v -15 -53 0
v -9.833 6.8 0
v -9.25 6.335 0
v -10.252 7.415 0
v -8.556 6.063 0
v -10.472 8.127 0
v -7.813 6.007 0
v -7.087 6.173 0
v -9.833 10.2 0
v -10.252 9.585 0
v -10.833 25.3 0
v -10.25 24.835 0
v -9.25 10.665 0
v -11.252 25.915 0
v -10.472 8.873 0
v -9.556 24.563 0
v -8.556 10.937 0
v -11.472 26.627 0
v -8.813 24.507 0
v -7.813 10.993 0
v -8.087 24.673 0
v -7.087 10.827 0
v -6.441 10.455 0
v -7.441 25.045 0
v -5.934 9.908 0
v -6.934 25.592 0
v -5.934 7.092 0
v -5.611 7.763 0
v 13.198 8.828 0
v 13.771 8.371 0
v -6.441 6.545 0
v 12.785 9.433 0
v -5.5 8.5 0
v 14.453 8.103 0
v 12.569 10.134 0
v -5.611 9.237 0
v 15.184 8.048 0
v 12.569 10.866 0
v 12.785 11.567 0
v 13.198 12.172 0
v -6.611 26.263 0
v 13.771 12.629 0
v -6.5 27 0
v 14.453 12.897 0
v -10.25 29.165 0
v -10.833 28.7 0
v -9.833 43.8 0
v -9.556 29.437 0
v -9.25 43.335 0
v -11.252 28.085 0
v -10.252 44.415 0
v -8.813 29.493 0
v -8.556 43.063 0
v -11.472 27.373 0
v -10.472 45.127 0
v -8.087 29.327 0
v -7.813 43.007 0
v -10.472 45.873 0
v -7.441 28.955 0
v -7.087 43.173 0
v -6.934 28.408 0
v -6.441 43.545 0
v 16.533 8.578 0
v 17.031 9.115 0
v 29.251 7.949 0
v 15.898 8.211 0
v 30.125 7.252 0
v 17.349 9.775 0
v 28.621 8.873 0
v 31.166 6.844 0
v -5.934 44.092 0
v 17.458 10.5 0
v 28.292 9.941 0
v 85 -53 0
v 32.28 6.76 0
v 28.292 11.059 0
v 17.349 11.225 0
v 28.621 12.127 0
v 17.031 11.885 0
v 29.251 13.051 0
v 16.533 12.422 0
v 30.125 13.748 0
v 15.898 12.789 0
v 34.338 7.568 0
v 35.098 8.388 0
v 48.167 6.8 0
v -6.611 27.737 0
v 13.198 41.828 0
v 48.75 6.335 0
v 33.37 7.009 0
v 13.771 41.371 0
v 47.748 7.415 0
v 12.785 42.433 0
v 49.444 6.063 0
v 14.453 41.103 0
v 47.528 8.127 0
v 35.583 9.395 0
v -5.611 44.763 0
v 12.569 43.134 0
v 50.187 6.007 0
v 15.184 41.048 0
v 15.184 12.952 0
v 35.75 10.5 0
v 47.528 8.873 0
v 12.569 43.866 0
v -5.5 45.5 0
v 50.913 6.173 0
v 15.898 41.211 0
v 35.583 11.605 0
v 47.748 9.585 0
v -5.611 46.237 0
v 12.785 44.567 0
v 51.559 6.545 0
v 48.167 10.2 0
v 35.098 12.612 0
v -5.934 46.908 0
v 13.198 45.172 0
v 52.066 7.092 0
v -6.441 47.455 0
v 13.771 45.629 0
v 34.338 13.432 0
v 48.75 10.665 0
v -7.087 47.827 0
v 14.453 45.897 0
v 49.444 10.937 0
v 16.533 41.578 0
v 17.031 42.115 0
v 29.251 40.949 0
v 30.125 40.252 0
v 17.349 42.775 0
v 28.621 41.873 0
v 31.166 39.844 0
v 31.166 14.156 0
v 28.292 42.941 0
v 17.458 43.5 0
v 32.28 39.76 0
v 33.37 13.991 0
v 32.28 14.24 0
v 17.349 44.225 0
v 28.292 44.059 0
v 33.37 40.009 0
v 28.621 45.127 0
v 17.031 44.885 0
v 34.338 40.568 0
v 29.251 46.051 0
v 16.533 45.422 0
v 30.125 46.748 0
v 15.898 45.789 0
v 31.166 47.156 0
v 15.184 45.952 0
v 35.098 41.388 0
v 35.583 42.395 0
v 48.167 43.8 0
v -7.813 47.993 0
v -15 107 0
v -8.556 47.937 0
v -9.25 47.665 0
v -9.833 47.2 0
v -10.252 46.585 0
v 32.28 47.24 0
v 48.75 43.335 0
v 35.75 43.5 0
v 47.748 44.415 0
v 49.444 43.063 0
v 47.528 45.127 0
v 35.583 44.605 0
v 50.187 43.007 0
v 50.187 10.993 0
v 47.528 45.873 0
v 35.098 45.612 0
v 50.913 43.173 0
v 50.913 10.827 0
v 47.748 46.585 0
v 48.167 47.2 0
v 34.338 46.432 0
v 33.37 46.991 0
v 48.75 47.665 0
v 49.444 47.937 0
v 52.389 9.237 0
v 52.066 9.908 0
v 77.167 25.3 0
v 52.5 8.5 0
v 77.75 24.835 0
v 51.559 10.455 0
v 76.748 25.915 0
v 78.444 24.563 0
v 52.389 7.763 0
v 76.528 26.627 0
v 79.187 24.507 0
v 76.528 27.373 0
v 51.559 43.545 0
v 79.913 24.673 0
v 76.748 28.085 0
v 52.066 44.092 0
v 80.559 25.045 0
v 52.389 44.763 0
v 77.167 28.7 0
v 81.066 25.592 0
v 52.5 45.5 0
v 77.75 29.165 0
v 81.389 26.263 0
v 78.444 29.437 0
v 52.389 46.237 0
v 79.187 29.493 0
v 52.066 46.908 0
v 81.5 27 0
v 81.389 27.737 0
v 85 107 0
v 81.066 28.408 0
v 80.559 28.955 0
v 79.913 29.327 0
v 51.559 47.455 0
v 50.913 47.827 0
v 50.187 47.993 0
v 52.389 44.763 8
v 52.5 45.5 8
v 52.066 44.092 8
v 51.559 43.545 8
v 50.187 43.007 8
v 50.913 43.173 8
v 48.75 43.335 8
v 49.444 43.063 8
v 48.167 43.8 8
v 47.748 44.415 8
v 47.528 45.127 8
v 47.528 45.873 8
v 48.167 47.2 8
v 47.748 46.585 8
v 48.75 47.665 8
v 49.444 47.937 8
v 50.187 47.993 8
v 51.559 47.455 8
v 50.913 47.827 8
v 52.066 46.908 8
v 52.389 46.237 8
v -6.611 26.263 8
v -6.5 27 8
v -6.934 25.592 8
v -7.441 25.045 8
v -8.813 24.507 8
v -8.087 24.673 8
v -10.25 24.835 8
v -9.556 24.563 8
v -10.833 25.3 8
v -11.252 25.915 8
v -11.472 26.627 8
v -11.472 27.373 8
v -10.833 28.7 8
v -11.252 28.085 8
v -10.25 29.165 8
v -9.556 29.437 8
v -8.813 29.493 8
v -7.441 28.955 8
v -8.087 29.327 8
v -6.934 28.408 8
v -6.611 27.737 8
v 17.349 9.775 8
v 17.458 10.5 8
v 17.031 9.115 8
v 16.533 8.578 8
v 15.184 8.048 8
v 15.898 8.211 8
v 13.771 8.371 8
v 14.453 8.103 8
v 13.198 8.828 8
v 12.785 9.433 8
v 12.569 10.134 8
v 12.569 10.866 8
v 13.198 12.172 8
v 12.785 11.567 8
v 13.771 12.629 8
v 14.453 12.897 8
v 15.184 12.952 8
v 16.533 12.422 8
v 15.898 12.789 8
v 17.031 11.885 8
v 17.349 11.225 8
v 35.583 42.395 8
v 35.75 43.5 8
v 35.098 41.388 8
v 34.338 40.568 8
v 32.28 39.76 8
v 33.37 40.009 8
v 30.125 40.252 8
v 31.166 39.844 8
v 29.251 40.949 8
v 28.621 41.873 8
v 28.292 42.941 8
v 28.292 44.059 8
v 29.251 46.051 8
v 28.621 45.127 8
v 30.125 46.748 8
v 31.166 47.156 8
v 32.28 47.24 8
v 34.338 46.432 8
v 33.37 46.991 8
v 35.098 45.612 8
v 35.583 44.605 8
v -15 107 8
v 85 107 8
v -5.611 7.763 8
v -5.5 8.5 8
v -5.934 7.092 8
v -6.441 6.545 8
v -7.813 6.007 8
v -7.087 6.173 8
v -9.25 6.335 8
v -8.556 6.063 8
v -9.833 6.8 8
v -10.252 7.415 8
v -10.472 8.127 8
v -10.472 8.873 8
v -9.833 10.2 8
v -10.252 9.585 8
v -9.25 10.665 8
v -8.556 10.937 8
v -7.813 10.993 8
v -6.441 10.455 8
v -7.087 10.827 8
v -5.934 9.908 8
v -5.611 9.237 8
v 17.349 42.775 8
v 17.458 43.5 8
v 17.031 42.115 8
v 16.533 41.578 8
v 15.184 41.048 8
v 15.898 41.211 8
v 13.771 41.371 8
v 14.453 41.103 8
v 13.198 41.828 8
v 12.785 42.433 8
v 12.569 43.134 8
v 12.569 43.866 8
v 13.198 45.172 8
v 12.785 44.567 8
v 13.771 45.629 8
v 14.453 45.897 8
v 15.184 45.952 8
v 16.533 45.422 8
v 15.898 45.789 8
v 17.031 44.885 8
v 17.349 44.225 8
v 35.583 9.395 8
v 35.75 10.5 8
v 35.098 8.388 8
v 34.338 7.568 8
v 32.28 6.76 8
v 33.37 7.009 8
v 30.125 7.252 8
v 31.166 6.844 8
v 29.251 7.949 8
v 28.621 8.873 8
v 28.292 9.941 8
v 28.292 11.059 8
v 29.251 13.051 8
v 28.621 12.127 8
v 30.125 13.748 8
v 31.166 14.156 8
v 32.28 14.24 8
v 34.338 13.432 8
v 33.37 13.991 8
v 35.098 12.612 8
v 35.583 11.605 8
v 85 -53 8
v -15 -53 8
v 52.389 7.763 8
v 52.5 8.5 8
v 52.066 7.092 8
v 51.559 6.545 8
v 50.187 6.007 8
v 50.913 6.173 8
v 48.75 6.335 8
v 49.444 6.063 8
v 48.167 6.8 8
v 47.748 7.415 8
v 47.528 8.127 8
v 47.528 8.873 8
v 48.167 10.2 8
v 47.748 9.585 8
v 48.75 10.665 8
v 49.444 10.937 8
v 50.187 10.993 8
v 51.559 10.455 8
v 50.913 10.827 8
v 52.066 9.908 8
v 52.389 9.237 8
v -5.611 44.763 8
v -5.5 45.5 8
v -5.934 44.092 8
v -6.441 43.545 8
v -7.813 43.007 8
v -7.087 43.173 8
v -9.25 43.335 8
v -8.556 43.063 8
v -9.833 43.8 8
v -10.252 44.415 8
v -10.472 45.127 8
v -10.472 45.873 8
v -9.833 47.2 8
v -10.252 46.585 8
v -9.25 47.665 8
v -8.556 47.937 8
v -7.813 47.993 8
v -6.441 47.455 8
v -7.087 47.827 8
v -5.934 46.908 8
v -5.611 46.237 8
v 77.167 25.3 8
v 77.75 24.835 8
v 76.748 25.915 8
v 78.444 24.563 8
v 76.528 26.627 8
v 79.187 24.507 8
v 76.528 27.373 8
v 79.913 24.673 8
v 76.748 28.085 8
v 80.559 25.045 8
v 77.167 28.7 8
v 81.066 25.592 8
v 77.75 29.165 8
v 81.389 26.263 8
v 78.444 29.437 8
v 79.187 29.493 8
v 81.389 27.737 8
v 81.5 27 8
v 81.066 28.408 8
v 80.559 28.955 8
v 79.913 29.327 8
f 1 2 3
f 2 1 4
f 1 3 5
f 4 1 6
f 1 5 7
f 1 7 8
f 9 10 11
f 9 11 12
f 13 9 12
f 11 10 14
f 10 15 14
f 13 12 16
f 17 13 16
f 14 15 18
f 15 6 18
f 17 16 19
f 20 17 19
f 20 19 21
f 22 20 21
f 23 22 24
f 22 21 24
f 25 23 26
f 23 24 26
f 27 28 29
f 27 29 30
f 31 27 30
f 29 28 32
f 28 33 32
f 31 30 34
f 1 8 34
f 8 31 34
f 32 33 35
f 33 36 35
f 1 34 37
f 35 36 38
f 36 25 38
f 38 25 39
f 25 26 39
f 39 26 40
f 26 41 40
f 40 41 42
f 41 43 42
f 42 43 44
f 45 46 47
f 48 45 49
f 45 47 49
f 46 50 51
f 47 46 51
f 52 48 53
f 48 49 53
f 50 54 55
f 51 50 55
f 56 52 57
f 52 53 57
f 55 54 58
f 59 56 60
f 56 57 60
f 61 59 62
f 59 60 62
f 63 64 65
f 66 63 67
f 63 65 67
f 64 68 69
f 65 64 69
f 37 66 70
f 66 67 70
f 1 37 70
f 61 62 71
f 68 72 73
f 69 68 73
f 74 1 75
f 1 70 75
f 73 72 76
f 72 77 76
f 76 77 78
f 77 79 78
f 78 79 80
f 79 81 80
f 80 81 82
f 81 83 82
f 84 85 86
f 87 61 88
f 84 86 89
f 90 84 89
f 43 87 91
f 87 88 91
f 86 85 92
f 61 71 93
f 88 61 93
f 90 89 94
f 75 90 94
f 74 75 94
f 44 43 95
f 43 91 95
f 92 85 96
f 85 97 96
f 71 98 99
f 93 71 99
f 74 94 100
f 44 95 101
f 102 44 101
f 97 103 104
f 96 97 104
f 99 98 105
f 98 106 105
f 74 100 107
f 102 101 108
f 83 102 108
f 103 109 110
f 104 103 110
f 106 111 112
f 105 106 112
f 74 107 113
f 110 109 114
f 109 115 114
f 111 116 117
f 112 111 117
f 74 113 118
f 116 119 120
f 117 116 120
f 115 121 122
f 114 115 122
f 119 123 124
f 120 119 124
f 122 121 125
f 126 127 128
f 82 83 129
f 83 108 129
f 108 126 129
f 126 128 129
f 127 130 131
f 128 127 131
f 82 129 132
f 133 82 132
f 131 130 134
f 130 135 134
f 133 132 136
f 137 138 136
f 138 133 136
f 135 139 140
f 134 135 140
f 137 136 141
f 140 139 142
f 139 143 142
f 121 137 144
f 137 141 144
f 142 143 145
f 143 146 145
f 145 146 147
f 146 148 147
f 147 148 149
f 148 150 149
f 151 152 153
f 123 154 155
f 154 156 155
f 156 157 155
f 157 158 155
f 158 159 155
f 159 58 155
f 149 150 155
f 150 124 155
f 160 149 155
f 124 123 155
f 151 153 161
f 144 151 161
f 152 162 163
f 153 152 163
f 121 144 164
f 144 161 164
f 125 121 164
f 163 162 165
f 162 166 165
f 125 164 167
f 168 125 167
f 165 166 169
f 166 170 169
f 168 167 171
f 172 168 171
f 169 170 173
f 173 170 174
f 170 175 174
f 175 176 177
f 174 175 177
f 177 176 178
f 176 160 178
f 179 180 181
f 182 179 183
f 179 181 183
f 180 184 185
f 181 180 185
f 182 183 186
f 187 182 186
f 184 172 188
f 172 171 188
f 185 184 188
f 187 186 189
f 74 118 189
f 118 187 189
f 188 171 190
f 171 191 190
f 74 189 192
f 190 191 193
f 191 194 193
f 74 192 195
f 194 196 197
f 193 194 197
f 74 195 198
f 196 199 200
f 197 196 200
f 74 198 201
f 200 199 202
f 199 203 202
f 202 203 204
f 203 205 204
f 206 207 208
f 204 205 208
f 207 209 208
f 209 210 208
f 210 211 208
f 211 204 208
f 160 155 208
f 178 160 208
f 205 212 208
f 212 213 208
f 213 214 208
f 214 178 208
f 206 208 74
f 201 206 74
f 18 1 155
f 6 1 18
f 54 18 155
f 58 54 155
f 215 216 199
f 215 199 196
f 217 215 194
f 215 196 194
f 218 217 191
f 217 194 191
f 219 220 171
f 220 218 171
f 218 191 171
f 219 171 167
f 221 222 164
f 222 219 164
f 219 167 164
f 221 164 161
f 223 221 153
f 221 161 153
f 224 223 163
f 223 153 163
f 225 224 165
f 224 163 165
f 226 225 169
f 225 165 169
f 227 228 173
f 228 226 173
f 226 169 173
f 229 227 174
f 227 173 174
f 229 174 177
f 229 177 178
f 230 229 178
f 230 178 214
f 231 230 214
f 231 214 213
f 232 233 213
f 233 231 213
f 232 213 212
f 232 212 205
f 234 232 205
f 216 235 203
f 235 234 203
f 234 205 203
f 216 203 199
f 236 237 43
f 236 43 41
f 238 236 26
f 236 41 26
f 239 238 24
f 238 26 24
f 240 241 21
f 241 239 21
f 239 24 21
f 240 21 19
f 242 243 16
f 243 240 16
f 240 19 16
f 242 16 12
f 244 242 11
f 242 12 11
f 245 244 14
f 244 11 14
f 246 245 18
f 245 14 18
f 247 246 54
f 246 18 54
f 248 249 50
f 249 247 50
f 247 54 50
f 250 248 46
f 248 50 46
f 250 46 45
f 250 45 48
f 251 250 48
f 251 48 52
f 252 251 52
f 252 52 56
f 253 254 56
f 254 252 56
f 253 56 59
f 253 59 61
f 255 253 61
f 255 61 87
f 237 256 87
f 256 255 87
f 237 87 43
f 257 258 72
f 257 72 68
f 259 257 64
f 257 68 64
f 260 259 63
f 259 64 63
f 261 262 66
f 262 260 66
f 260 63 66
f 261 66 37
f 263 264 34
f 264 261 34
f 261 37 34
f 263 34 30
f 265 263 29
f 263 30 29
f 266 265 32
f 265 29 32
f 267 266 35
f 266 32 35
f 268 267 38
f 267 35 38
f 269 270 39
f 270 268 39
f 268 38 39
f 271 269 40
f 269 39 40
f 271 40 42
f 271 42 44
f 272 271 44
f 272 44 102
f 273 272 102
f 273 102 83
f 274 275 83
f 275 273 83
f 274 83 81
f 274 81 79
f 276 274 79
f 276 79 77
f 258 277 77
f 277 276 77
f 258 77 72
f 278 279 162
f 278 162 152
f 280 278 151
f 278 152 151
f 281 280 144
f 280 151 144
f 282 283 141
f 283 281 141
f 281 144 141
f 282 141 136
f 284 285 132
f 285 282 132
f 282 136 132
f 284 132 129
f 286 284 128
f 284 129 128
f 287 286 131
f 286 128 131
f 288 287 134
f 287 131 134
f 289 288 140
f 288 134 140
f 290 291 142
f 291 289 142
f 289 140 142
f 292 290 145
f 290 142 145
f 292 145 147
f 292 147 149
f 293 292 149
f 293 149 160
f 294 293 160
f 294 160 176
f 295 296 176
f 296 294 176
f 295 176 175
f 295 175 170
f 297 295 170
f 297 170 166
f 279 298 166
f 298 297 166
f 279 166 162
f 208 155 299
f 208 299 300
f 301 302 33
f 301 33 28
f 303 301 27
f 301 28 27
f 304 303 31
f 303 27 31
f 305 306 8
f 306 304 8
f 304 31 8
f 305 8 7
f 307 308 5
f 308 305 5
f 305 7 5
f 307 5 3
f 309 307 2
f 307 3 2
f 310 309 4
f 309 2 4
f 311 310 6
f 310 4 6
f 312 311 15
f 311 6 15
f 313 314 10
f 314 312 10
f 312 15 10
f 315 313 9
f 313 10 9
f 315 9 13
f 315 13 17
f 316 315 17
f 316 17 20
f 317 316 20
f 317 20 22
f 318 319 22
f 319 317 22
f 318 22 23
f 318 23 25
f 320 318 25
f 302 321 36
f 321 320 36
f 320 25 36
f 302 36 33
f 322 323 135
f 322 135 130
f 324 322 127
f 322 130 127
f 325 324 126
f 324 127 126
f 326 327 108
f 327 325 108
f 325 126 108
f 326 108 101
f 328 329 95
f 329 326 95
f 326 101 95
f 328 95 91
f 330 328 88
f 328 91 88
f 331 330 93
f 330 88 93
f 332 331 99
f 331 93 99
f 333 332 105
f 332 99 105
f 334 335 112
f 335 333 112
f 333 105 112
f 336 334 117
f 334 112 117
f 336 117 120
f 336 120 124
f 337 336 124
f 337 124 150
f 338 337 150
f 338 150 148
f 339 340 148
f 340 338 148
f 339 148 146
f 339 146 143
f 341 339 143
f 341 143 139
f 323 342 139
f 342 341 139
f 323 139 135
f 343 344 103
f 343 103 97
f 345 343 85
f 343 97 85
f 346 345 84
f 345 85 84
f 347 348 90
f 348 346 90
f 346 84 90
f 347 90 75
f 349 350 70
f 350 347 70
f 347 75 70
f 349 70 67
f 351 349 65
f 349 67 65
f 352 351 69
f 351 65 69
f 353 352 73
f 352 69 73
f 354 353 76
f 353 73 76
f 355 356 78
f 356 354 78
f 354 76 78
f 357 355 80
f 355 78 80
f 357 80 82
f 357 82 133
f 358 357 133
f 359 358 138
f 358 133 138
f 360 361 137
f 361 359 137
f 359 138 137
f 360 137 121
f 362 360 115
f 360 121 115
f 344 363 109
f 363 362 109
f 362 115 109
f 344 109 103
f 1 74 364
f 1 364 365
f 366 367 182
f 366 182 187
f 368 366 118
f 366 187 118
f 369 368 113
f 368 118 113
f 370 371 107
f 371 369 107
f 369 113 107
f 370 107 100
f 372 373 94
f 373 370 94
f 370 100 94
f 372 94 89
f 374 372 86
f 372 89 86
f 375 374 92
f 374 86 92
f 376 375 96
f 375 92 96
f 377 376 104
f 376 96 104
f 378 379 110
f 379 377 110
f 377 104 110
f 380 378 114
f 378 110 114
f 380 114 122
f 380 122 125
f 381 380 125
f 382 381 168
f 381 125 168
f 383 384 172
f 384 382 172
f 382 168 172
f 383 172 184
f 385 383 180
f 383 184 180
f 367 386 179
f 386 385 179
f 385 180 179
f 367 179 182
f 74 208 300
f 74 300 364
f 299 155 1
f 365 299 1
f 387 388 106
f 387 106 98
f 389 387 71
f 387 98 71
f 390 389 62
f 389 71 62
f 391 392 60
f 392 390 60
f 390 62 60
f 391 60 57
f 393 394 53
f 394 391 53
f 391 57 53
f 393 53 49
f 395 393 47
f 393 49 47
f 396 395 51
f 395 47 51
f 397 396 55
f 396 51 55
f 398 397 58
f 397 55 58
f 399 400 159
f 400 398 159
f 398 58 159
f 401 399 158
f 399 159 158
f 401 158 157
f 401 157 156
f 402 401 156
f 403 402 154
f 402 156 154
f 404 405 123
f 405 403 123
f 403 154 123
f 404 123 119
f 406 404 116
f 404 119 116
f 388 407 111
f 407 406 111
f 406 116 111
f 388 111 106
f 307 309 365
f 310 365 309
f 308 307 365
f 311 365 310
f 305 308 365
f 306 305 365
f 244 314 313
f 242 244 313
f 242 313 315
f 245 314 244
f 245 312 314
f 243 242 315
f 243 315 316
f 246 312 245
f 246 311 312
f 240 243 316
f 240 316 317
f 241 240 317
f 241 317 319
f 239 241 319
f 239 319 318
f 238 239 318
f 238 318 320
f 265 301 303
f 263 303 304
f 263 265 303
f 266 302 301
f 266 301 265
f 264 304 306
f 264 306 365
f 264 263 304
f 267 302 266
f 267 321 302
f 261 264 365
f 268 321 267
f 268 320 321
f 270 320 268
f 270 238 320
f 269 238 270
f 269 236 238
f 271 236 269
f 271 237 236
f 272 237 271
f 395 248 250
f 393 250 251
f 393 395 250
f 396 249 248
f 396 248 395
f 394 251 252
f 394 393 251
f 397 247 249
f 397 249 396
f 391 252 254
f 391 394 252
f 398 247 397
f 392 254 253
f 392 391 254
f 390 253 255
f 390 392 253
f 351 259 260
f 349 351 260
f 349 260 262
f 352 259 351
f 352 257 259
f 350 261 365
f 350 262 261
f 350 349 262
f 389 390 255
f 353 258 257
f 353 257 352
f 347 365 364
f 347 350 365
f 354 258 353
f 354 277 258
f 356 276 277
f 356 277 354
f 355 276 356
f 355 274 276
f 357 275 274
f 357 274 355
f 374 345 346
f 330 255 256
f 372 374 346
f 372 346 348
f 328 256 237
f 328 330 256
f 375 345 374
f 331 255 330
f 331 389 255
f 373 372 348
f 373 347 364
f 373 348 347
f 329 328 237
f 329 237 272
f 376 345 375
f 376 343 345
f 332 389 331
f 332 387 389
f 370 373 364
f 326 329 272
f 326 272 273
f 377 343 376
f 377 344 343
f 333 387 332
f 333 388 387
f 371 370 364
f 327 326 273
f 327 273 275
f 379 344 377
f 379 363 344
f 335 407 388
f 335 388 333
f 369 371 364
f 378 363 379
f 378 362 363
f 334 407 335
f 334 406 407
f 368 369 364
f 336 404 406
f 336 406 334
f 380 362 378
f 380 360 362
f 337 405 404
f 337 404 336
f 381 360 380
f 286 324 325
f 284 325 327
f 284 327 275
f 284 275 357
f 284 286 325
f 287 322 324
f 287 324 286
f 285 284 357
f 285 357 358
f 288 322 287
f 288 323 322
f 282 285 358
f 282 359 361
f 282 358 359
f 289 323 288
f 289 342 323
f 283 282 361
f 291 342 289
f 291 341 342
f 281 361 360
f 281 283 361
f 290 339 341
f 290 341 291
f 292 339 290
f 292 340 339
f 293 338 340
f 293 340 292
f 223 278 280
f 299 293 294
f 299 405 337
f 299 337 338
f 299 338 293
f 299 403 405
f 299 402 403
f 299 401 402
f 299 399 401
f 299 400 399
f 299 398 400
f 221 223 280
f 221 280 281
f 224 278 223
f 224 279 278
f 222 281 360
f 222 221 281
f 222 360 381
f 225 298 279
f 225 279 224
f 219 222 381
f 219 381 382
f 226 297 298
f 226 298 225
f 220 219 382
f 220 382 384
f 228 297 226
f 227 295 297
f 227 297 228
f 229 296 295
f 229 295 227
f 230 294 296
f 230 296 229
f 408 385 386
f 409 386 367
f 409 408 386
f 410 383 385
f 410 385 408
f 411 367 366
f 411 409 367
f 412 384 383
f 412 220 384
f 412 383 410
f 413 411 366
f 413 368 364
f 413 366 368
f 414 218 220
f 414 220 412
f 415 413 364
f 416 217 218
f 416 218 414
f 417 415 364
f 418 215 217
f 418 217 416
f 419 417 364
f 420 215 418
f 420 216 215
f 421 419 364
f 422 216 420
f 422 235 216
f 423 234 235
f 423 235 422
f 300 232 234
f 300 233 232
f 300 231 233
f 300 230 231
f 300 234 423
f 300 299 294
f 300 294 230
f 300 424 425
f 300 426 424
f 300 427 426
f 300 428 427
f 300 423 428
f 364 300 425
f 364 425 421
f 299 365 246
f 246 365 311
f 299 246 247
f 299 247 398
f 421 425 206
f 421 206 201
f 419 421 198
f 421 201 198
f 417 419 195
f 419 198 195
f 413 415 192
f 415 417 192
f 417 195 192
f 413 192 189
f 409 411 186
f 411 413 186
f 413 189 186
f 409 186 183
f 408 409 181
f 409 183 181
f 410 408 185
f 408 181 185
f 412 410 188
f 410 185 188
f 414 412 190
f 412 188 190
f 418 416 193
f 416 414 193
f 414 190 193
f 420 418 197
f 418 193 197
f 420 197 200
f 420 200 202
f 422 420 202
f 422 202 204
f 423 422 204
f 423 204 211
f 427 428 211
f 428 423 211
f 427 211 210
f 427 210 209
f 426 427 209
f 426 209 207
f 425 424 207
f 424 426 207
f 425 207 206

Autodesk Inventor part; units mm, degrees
ref_plane "YZ Plane" through (0, 0, 0) normal (1, 0, 0) x (0, 1, 0)
ref_plane "XZ Plane" through (0, 0, 0) normal (0, 1, 0) x (-1, 0, 0)
ref_plane "XY Plane" through (0, 0, 0) normal (0, 0, 1) x (1, 0, 0)
sketch "Sketch1" plane through (0, 0, 0) normal (0, 0, 1) x (1, 0, 0)
  circle A0 centre (50, 45.5) radius 2.5 projected
  circle A1 centre (-8, 45.5) radius 2.5 projected
  circle A2 centre (32, 43.5) radius 3.75 projected
  circle A3 centre (15, 43.5) radius 2.4585 projected
  line L0 (57, 54) -> (-15, 54) projected
  line L1 (-15, 54) -> (-15, 37) projected
  line L2 (57, 37) -> (-15, 37) projected
  line L3 (57, 54) -> (57, 37) projected
  circle A4 centre (50, 8.5) radius 2.5 projected
  circle A5 centre (-8, 8.5) radius 2.5 projected
  circle A6 centre (32, 10.5) radius 3.75 projected
  circle A7 centre (15, 10.5) radius 2.4585 projected
  line L4 (57, 0) -> (-15, 0) projected
  line L5 (57, 0) -> (57, 17) projected
  line L6 (57, 17) -> (-15, 17) projected
  line L7 (-15, 0) -> (-15, 17) projected
  line L8 (-15, 107) -> (85, 107)
  line L9 (85, 107) -> (85, -53)
  line L10 (85, -53) -> (-15, -53)
  line L11 (-15, -53) -> (-15, 107)
  line L12 (-94.8305, 27) -> (141.7075, 27) construction
  circle A8 centre (-9, 27) radius 2.5
  circle A9 centre (79, 27) radius 2.5
  point P0 (0, 0)
  point P1 (52.2653, 16.3)
  dimension "d0" = 100
  dimension "d1" = 160
  dimension "d2" = 20
  dimension "d3" = 10
  dimension "d4" = 72
  dimension "d5" = 0
  dimension "d6" = 80
  dimension "d7" = 5
  dimension "d8" = 5
  dimension "d9" = 6
  dimension "d10" = 6
extrude "Extrusion1" add sketch "Sketch1" along normal blind 8
equation "\"d3\" = 0.5 * d2"
equation "\"d6\" = 0.5 * d1"
properties part number "spool main support"
